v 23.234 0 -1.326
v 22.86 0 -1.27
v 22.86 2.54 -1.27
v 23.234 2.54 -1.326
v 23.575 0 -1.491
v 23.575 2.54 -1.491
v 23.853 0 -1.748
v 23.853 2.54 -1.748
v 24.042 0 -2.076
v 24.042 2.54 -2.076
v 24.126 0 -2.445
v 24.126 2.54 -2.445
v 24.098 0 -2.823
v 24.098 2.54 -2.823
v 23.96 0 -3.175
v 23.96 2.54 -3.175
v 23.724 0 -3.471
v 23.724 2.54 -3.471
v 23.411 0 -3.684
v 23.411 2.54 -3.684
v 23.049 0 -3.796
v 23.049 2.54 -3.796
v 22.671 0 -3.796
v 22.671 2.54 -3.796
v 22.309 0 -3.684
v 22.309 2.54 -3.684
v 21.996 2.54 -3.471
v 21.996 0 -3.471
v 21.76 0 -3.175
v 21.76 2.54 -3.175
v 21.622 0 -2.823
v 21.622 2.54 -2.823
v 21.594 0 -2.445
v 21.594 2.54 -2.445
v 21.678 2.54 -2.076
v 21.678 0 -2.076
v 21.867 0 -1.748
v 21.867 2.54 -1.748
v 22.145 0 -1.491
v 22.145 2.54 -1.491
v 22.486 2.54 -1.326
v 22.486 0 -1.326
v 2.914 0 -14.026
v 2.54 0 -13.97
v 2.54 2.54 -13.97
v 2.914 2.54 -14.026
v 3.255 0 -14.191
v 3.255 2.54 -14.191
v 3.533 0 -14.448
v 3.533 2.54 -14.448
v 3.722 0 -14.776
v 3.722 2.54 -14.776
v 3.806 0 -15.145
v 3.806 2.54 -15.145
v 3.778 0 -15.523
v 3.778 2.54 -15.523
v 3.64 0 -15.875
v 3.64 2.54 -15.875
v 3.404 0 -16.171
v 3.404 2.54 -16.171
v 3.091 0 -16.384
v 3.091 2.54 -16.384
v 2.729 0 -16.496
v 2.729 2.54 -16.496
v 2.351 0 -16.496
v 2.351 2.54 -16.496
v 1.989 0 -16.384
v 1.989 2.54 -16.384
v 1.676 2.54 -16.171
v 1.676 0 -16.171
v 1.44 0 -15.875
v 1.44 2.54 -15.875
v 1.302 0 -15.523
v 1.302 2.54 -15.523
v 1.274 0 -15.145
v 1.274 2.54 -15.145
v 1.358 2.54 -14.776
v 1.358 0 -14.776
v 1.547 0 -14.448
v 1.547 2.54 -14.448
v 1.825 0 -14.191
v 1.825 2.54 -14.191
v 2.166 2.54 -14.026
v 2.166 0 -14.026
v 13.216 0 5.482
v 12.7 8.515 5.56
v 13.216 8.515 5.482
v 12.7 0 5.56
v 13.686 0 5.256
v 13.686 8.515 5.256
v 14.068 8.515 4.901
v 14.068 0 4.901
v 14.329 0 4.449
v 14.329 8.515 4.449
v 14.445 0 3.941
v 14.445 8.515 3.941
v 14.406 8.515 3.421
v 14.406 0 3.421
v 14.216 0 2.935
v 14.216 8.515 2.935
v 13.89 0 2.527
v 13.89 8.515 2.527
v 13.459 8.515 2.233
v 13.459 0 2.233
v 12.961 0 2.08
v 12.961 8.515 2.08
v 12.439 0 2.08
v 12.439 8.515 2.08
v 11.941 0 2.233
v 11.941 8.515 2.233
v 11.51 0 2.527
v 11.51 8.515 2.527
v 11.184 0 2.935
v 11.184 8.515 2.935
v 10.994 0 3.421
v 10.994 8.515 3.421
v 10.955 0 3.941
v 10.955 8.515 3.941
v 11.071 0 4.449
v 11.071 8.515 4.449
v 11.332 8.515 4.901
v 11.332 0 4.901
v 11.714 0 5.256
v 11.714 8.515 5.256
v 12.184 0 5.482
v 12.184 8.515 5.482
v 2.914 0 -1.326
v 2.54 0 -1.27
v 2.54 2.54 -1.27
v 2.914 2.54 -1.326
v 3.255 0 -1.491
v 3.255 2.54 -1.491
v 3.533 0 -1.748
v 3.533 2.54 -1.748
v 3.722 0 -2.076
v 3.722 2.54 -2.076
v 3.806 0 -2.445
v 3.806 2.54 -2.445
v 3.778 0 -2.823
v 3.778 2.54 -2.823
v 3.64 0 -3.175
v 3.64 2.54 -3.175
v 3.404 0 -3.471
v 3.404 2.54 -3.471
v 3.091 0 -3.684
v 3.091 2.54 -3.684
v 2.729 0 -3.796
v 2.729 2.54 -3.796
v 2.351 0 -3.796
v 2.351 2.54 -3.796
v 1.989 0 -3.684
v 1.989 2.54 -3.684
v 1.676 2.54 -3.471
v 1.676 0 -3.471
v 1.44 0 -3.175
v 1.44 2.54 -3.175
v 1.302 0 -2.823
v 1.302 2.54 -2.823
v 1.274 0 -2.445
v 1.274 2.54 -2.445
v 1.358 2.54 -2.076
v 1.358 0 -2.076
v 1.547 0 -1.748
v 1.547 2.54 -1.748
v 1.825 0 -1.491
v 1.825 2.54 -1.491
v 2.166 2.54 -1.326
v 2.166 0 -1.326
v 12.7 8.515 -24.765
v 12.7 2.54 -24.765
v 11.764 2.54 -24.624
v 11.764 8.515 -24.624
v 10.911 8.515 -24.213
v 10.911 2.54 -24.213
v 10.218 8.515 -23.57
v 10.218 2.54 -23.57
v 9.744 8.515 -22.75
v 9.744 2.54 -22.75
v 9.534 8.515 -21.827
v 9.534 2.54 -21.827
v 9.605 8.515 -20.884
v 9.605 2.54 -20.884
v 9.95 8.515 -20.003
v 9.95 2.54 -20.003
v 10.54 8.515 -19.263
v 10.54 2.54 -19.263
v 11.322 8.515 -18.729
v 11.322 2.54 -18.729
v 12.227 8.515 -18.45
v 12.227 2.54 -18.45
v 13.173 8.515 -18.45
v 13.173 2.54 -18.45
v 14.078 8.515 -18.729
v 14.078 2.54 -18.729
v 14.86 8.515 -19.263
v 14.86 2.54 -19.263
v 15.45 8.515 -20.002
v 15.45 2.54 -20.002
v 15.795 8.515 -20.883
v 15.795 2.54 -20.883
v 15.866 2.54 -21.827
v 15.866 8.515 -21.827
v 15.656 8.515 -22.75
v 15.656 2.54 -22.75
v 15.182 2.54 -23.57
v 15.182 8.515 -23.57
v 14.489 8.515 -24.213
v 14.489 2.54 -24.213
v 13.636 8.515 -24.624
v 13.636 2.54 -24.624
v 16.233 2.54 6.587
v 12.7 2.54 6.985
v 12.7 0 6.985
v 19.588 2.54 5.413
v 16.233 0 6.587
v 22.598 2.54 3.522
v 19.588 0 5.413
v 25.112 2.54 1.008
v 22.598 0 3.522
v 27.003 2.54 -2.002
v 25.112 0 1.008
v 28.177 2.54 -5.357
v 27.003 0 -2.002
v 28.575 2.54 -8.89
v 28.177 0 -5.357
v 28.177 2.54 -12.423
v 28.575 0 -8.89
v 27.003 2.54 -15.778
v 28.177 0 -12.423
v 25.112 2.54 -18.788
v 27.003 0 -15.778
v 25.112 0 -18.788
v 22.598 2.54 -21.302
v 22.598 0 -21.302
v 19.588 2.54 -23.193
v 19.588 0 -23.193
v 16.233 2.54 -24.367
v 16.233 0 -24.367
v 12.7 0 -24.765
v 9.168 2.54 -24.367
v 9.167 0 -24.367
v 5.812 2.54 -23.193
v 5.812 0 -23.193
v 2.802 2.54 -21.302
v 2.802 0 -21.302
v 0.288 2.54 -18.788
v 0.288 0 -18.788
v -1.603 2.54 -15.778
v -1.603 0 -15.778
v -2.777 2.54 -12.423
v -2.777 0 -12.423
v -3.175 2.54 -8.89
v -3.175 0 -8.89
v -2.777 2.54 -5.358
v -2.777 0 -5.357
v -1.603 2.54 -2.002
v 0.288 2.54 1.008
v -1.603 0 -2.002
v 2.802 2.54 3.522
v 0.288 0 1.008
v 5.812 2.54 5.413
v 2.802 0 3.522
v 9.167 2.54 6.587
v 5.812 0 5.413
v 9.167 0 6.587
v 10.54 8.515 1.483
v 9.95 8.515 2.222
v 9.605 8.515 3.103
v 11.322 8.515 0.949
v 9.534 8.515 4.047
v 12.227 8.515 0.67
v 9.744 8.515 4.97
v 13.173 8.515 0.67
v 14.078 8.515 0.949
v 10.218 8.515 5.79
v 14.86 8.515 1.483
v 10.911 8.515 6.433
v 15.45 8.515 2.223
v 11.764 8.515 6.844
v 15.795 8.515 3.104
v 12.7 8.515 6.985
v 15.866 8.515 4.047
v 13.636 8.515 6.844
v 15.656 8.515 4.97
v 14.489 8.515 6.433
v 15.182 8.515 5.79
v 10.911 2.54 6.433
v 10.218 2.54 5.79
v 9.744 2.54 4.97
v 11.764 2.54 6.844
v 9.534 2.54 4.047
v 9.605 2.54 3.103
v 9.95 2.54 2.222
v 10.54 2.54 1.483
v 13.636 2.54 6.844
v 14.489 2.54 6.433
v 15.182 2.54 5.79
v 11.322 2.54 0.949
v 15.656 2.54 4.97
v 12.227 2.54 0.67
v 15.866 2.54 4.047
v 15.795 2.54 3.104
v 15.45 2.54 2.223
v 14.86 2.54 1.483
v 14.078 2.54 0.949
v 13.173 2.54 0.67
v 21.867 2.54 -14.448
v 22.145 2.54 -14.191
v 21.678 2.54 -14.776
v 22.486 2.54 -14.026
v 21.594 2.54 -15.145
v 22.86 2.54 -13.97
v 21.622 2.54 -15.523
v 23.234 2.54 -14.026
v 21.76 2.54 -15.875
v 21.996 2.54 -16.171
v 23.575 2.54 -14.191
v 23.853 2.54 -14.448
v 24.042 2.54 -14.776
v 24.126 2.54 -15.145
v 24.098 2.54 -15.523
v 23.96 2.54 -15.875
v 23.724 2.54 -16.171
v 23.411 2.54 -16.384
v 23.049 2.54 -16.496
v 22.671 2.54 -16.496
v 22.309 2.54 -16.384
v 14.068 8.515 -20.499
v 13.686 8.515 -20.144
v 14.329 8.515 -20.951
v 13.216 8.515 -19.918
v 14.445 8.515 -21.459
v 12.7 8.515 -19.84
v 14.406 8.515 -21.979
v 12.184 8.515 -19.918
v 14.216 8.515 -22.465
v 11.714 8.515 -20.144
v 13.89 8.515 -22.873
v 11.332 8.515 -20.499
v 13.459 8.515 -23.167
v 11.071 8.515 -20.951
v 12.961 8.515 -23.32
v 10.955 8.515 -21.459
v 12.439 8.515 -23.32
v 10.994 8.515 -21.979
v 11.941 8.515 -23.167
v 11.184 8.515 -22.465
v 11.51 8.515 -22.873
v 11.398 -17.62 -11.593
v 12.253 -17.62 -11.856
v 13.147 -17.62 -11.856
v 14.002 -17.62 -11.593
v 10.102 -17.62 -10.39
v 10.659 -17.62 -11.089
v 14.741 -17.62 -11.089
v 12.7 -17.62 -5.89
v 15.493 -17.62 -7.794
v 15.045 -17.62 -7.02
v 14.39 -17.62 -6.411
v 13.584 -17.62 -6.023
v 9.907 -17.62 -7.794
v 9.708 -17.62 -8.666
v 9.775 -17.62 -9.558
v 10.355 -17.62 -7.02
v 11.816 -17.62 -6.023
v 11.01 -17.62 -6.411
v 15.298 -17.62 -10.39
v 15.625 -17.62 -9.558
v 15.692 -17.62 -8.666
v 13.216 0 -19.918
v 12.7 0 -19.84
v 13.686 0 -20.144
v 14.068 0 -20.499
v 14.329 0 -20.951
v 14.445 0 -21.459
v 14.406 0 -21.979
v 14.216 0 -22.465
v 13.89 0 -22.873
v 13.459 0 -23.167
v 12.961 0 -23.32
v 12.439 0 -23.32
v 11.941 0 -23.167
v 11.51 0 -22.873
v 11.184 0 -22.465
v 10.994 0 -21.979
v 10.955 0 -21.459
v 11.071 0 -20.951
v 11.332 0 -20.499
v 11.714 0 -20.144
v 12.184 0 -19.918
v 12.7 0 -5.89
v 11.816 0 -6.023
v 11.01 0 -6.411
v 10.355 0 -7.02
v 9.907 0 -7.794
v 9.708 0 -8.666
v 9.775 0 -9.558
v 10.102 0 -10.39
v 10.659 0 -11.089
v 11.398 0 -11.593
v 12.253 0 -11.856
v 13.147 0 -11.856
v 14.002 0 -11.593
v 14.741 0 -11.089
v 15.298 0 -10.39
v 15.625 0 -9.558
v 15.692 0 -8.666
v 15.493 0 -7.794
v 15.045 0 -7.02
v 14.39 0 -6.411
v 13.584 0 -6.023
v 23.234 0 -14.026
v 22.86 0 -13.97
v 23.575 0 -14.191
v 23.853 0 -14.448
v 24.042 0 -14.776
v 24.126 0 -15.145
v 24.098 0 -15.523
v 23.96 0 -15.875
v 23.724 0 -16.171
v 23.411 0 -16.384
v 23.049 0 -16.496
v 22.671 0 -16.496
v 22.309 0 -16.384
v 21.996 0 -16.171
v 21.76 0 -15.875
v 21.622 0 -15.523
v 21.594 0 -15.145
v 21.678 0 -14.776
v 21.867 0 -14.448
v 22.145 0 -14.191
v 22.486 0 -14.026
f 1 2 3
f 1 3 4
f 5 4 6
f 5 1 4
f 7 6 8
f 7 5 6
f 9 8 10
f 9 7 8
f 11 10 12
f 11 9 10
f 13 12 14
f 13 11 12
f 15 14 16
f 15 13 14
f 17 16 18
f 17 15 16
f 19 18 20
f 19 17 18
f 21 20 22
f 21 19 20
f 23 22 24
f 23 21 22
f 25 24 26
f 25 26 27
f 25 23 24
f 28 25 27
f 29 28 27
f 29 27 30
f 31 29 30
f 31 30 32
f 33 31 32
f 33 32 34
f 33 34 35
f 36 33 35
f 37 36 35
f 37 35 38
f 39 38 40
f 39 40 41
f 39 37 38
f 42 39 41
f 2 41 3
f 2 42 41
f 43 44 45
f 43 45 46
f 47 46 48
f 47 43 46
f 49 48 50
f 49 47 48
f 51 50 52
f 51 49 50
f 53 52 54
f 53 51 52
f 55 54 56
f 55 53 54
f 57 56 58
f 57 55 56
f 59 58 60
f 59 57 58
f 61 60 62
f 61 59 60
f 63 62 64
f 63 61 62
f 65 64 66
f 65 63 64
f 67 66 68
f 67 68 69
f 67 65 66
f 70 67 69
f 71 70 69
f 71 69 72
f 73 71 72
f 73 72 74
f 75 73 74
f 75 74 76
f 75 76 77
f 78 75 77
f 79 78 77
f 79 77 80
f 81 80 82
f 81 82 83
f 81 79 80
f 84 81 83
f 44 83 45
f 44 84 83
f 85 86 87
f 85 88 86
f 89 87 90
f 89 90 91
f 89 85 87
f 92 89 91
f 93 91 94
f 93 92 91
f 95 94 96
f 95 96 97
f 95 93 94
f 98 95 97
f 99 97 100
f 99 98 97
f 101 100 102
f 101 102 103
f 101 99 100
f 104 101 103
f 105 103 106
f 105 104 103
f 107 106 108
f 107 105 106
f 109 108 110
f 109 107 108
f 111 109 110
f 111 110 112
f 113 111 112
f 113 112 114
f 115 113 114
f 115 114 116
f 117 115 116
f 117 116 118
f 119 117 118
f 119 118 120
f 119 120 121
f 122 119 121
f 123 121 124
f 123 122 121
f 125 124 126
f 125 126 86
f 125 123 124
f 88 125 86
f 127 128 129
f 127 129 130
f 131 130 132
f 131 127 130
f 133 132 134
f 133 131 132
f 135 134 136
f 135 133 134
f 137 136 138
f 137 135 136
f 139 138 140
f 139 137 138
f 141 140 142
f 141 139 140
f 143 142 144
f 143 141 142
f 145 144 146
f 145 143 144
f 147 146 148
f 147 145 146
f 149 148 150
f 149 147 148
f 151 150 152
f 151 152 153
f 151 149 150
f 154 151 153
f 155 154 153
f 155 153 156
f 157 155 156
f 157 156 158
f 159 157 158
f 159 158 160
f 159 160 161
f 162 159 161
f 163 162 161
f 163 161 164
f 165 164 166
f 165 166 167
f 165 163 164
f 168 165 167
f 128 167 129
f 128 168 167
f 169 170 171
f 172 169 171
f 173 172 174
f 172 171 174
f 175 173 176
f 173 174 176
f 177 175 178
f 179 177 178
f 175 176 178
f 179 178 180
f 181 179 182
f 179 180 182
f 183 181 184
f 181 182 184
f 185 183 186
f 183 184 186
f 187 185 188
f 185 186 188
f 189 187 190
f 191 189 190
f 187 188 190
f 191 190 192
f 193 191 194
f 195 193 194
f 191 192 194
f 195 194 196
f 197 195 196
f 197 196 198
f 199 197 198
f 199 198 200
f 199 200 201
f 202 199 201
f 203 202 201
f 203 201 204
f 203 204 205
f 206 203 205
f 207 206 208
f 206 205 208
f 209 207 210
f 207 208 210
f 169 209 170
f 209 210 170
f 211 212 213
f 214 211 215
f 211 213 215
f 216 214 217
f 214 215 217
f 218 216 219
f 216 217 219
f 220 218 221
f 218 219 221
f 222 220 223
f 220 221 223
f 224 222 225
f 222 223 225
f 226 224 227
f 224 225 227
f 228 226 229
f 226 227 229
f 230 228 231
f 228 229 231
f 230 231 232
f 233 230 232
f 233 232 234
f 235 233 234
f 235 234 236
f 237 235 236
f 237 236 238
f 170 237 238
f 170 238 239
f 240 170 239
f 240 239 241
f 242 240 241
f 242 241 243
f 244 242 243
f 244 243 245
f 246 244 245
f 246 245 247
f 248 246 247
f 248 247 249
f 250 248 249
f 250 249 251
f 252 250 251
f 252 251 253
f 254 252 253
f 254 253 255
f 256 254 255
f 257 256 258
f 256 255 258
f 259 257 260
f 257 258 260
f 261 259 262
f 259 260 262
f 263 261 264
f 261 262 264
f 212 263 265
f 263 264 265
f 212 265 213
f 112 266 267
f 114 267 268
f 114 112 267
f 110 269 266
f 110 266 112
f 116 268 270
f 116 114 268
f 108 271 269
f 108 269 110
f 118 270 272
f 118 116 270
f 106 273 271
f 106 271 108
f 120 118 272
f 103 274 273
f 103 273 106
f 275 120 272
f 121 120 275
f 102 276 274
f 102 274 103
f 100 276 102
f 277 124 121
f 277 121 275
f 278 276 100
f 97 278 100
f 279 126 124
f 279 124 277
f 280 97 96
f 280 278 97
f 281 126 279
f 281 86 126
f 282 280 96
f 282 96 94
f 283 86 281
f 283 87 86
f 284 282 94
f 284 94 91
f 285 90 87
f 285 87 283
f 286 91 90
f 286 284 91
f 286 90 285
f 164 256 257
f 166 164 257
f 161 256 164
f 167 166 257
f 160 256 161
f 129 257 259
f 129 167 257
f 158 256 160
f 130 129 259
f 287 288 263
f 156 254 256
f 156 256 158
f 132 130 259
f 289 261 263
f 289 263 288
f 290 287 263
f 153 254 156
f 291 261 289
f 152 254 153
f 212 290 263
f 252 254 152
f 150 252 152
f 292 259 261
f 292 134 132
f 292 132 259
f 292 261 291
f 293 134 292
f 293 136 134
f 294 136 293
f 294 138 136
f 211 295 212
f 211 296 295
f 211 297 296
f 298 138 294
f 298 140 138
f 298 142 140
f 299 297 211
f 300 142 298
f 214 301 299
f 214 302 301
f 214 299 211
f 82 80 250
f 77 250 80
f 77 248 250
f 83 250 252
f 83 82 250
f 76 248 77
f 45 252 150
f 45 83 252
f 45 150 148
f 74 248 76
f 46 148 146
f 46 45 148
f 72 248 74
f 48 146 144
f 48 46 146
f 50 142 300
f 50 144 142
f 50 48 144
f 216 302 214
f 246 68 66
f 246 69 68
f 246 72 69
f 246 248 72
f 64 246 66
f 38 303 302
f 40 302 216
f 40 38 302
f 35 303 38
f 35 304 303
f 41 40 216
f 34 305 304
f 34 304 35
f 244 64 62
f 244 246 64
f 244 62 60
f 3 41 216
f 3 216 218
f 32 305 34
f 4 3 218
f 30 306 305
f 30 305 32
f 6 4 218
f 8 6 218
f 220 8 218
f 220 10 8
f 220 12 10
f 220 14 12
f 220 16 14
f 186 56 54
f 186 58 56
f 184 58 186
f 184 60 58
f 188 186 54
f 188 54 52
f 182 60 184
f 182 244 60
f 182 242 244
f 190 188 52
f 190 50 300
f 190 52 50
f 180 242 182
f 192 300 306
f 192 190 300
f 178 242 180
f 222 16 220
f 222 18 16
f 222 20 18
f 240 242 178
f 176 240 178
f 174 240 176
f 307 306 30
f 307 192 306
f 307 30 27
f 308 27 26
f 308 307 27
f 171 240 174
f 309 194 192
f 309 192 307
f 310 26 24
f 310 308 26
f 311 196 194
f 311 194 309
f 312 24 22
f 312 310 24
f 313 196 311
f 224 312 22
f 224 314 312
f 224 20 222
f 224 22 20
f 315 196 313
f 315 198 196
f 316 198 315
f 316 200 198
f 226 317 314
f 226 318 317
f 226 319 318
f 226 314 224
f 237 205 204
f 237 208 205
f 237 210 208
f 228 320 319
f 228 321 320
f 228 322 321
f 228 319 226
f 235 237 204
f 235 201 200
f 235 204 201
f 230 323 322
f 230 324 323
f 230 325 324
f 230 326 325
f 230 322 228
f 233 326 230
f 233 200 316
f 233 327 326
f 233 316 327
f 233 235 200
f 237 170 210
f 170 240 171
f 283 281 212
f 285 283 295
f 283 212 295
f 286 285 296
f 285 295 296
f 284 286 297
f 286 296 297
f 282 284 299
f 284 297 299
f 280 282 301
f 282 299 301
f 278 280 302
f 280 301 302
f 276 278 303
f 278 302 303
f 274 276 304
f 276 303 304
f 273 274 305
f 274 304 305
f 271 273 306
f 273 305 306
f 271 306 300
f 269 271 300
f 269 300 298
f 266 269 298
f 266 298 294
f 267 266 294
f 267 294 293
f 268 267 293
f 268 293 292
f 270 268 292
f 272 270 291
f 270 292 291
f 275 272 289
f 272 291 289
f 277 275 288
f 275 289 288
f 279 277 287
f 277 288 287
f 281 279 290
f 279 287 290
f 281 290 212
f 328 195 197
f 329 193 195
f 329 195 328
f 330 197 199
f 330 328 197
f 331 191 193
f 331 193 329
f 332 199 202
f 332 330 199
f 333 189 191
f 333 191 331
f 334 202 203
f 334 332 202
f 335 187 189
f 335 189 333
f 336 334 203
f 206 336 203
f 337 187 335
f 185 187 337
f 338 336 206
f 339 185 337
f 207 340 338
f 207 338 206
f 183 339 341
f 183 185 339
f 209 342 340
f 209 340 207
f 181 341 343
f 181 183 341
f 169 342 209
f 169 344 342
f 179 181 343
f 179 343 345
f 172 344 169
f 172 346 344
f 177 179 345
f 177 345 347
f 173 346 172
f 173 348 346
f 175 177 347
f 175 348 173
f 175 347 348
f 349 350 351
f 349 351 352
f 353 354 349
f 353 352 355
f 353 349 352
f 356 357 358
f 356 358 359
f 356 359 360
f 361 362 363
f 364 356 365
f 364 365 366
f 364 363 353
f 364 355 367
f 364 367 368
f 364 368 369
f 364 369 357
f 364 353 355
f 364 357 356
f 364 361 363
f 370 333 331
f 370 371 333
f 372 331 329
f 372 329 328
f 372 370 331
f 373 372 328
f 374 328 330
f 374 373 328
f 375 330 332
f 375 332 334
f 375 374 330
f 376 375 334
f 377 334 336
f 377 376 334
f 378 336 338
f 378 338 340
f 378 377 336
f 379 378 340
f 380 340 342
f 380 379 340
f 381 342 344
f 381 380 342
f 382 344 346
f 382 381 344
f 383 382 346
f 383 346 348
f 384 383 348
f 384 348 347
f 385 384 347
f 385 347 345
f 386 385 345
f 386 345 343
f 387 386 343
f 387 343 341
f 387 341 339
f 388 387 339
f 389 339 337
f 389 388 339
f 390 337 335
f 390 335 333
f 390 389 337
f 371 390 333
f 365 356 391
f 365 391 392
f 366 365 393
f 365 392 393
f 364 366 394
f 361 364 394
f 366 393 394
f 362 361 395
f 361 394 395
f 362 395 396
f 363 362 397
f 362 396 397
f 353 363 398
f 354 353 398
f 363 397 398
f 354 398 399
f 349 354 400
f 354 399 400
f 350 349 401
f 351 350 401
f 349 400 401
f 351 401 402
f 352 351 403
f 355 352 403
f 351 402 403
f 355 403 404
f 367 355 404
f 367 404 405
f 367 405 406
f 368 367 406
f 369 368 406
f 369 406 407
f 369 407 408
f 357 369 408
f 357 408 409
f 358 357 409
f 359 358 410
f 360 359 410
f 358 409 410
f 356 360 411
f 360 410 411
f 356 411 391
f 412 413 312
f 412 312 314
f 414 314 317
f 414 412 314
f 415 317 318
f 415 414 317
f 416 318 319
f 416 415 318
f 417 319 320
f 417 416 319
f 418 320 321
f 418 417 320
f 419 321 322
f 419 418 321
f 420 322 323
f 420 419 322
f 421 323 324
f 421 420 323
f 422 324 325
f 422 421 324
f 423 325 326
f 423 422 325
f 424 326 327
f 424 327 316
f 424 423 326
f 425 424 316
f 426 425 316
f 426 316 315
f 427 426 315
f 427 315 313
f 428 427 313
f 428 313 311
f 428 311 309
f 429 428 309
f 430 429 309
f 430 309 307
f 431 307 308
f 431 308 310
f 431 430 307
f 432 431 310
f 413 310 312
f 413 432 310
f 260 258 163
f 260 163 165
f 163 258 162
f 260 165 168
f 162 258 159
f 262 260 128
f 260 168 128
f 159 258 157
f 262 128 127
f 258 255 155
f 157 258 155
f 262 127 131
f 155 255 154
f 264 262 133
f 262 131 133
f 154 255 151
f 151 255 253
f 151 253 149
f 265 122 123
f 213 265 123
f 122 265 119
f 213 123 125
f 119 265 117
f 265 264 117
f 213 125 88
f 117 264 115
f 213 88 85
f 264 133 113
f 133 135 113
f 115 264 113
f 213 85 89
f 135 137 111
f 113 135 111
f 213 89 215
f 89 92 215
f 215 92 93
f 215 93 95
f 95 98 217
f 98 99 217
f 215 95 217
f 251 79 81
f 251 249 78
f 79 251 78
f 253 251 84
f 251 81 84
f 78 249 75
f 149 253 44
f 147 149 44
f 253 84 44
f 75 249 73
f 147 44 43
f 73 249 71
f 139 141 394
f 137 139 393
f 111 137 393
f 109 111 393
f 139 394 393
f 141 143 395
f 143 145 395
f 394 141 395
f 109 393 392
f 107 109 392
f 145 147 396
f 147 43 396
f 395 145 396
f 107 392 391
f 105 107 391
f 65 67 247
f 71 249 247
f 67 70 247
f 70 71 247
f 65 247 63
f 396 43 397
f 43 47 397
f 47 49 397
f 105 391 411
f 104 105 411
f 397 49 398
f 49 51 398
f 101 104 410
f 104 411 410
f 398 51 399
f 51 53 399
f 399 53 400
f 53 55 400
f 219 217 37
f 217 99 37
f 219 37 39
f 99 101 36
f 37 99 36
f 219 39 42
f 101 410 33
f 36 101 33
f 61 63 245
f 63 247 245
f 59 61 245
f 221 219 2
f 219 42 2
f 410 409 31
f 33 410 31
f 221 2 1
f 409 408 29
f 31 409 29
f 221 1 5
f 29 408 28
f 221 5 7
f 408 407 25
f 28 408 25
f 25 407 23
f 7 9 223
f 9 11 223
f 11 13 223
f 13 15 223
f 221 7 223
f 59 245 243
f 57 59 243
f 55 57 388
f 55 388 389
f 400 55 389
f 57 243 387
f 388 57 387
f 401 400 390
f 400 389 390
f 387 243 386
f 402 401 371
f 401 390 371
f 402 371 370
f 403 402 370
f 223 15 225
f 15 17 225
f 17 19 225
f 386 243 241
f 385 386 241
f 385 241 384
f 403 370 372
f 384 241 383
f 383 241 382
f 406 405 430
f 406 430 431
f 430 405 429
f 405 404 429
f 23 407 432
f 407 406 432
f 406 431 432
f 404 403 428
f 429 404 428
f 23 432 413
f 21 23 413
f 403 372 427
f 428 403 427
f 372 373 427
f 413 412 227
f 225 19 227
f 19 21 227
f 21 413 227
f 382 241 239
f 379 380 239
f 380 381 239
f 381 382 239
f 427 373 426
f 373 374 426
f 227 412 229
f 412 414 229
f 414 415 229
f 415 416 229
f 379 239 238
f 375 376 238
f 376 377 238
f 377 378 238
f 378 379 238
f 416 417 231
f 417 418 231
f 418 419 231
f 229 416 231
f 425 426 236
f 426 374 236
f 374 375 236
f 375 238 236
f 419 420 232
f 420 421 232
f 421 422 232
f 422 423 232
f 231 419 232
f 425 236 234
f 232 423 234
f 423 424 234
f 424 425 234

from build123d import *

# Parameters (mm, degrees)
SKETCH1_R           = 15.875
SKETCH1_R_2         = 1.75
SKETCH1_W           = 25.4
SKETCH1_H           = 17.78
SKETCH1_R_3         = 1.27
BOSS_EXTRUDE1_DEPTH = 2.54
SKETCH2_R           = 3.175
SKETCH2_R_2         = 1.75
BOSS_EXTRUDE2_DEPTH = 5.974999988
SKETCH3_R           = 3
BOSS_EXTRUDE3_DEPTH = 17.61998


with BuildPart() as part:
    # Sketch1 → Boss-Extrude1 (new body)
    # profile 1 of 2: a face of its own
    with BuildSketch(Plane(origin=(0, 0, 0), x_dir=(1, 0, 0), z_dir=(0, 1, 0))):
        with Locations(Location((12.7, 8.89, 0), (0, 0, 270))):
            Circle(SKETCH1_R)
        with Locations(Location((12.7, 21.59, 0), (0, 0, 270))):
            Circle(SKETCH1_R_2, mode=Mode.SUBTRACT)
        with Locations(Location((12.7, -3.81, 0), (0, 0, 270))):
            Circle(SKETCH1_R_2, mode=Mode.SUBTRACT)
        with Locations((12.7, 8.89)):
            Rectangle(SKETCH1_W, SKETCH1_H, mode=Mode.SUBTRACT)
    # profile 2 of 2: a face of its own
    with BuildSketch(Plane(origin=(0, 0, 0), x_dir=(1, 0, 0), z_dir=(0, 1, 0))):
        with Locations((12.7, 8.89)):
            Rectangle(SKETCH1_W, SKETCH1_H)
        with Locations(Location((22.86, 15.24, 0), (0, 0, 270))):
            Circle(SKETCH1_R_3, mode=Mode.SUBTRACT)
        with Locations(Location((2.54, 15.24, 0), (0, 0, 270))):
            Circle(SKETCH1_R_3, mode=Mode.SUBTRACT)
        with Locations(Location((22.86, 2.54, 0), (0, 0, 270))):
            Circle(SKETCH1_R_3, mode=Mode.SUBTRACT)
        with Locations(Location((2.54, 2.54, 0), (0, 0, 270))):
            Circle(SKETCH1_R_3, mode=Mode.SUBTRACT)
    extrude(amount=BOSS_EXTRUDE1_DEPTH)

    # Sketch2 → Boss-Extrude2 (add)
    # profile 1 of 2: a face of its own
    with BuildSketch(Plane(origin=(0, 2.54, 0), x_dir=(1, 0, 0), z_dir=(0, 1, 0))):
        with Locations(Location((12.7, 21.59, 0), (0, 0, 89.999491582))):
            Circle(SKETCH2_R)
        with Locations(Location((12.7, 21.59, 0), (0, 0, 270))):
            Circle(SKETCH2_R_2, mode=Mode.SUBTRACT)
    # profile 2 of 2: a face of its own
    with BuildSketch(Plane(origin=(0, 2.54, 0), x_dir=(1, 0, 0), z_dir=(0, 1, 0))):
        with Locations(Location((12.7, -3.81, 0), (0, 0, 269.999491581))):
            Circle(SKETCH2_R)
        with Locations(Location((12.7, -3.81, 0), (0, 0, 270))):
            Circle(SKETCH2_R_2, mode=Mode.SUBTRACT)
    extrude(amount=BOSS_EXTRUDE2_DEPTH)

    # Sketch3 → Boss-Extrude3 (add)
    with BuildSketch(Plane.XZ):
        with Locations(Location((12.7, -8.89, 0), (0, 0, 90))):
            Circle(SKETCH3_R)
    extrude(amount=BOSS_EXTRUDE3_DEPTH)


solid = part.part
